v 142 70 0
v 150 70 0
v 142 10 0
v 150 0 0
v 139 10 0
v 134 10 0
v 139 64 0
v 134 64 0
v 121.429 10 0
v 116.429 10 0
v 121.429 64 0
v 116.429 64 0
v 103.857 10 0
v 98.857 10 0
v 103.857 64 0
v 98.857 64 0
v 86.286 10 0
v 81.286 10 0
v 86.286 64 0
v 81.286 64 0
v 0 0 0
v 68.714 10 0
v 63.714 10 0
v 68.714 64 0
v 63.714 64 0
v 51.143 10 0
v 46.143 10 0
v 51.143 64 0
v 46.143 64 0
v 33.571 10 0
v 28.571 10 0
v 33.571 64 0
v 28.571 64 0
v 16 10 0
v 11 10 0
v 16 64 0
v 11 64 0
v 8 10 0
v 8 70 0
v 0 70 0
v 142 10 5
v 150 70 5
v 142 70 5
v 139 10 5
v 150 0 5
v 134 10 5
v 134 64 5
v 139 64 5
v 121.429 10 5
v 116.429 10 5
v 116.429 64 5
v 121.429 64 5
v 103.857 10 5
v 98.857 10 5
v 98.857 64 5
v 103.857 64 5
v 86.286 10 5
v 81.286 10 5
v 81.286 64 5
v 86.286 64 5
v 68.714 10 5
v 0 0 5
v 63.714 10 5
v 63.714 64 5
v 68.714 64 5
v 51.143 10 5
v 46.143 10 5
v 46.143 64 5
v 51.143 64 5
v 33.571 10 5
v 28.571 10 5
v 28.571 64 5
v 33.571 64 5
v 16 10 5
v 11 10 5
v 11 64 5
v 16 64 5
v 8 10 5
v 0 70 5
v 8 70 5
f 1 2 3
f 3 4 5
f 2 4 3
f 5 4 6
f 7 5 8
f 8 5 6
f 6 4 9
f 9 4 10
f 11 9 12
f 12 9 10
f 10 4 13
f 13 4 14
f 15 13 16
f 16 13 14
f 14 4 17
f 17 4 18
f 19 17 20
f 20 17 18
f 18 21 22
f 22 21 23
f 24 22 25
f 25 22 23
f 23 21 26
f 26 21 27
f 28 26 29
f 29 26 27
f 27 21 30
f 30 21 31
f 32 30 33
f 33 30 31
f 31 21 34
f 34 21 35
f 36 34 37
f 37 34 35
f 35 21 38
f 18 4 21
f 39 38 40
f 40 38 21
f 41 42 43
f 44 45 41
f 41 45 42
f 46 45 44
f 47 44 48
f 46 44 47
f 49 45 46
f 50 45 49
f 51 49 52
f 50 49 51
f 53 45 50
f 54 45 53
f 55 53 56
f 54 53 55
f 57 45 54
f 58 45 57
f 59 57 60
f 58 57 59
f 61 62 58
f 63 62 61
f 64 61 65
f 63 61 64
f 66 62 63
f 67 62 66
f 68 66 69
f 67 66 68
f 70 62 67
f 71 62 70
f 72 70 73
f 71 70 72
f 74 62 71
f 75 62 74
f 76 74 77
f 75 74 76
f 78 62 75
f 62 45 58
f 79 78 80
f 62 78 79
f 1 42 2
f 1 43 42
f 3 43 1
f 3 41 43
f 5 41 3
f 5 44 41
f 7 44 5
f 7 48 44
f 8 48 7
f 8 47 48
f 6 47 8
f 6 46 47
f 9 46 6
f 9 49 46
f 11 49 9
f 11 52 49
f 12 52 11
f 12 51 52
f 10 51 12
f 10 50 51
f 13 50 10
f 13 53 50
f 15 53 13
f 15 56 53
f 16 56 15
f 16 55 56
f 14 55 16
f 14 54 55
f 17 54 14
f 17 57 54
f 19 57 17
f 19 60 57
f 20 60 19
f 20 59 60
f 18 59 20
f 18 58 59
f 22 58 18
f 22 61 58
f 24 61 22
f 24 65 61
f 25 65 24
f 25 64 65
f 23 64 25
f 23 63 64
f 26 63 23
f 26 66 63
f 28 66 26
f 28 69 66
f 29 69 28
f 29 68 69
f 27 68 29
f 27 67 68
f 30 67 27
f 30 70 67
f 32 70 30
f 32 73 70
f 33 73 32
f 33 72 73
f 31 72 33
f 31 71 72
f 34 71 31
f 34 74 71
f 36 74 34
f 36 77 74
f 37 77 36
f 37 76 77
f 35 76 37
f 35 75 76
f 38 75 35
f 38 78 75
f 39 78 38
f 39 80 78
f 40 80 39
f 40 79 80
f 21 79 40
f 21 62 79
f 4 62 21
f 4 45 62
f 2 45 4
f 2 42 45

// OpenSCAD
$fn = 32;

// ----------------------------------------------------------------------
// Guard grille: 8 slats over a 150 x 70 mm plate
// ----------------------------------------------------------------------

// --- parameters (mm) ---
profile_height = 5;       // extrusion height
profile_points = 40;      // points of the closed outline

profile = [[0, 0], [150, 0], [150, 70], [142, 70], [142, 10], [139, 10], [139, 64], [134, 64], [134, 10], [121.429, 10], [121.429, 64], [116.429, 64], [116.429, 10], [103.857, 10], [103.857, 64], [98.857, 64], [98.857, 10], [86.286, 10], [86.286, 64], [81.286, 64], [81.286, 10], [68.714, 10], [68.714, 64], [63.714, 64], [63.714, 10], [51.143, 10], [51.143, 64], [46.143, 64], [46.143, 10], [33.571, 10], [33.571, 64], [28.571, 64], [28.571, 10], [16, 10], [16, 64], [11, 64], [11, 10], [8, 10], [8, 70], [0, 70]];  // single closed polygon, 40 points, counter clockwise

// --- the one profile operation ---
linear_extrude(height = profile_height) polygon(points = profile);
